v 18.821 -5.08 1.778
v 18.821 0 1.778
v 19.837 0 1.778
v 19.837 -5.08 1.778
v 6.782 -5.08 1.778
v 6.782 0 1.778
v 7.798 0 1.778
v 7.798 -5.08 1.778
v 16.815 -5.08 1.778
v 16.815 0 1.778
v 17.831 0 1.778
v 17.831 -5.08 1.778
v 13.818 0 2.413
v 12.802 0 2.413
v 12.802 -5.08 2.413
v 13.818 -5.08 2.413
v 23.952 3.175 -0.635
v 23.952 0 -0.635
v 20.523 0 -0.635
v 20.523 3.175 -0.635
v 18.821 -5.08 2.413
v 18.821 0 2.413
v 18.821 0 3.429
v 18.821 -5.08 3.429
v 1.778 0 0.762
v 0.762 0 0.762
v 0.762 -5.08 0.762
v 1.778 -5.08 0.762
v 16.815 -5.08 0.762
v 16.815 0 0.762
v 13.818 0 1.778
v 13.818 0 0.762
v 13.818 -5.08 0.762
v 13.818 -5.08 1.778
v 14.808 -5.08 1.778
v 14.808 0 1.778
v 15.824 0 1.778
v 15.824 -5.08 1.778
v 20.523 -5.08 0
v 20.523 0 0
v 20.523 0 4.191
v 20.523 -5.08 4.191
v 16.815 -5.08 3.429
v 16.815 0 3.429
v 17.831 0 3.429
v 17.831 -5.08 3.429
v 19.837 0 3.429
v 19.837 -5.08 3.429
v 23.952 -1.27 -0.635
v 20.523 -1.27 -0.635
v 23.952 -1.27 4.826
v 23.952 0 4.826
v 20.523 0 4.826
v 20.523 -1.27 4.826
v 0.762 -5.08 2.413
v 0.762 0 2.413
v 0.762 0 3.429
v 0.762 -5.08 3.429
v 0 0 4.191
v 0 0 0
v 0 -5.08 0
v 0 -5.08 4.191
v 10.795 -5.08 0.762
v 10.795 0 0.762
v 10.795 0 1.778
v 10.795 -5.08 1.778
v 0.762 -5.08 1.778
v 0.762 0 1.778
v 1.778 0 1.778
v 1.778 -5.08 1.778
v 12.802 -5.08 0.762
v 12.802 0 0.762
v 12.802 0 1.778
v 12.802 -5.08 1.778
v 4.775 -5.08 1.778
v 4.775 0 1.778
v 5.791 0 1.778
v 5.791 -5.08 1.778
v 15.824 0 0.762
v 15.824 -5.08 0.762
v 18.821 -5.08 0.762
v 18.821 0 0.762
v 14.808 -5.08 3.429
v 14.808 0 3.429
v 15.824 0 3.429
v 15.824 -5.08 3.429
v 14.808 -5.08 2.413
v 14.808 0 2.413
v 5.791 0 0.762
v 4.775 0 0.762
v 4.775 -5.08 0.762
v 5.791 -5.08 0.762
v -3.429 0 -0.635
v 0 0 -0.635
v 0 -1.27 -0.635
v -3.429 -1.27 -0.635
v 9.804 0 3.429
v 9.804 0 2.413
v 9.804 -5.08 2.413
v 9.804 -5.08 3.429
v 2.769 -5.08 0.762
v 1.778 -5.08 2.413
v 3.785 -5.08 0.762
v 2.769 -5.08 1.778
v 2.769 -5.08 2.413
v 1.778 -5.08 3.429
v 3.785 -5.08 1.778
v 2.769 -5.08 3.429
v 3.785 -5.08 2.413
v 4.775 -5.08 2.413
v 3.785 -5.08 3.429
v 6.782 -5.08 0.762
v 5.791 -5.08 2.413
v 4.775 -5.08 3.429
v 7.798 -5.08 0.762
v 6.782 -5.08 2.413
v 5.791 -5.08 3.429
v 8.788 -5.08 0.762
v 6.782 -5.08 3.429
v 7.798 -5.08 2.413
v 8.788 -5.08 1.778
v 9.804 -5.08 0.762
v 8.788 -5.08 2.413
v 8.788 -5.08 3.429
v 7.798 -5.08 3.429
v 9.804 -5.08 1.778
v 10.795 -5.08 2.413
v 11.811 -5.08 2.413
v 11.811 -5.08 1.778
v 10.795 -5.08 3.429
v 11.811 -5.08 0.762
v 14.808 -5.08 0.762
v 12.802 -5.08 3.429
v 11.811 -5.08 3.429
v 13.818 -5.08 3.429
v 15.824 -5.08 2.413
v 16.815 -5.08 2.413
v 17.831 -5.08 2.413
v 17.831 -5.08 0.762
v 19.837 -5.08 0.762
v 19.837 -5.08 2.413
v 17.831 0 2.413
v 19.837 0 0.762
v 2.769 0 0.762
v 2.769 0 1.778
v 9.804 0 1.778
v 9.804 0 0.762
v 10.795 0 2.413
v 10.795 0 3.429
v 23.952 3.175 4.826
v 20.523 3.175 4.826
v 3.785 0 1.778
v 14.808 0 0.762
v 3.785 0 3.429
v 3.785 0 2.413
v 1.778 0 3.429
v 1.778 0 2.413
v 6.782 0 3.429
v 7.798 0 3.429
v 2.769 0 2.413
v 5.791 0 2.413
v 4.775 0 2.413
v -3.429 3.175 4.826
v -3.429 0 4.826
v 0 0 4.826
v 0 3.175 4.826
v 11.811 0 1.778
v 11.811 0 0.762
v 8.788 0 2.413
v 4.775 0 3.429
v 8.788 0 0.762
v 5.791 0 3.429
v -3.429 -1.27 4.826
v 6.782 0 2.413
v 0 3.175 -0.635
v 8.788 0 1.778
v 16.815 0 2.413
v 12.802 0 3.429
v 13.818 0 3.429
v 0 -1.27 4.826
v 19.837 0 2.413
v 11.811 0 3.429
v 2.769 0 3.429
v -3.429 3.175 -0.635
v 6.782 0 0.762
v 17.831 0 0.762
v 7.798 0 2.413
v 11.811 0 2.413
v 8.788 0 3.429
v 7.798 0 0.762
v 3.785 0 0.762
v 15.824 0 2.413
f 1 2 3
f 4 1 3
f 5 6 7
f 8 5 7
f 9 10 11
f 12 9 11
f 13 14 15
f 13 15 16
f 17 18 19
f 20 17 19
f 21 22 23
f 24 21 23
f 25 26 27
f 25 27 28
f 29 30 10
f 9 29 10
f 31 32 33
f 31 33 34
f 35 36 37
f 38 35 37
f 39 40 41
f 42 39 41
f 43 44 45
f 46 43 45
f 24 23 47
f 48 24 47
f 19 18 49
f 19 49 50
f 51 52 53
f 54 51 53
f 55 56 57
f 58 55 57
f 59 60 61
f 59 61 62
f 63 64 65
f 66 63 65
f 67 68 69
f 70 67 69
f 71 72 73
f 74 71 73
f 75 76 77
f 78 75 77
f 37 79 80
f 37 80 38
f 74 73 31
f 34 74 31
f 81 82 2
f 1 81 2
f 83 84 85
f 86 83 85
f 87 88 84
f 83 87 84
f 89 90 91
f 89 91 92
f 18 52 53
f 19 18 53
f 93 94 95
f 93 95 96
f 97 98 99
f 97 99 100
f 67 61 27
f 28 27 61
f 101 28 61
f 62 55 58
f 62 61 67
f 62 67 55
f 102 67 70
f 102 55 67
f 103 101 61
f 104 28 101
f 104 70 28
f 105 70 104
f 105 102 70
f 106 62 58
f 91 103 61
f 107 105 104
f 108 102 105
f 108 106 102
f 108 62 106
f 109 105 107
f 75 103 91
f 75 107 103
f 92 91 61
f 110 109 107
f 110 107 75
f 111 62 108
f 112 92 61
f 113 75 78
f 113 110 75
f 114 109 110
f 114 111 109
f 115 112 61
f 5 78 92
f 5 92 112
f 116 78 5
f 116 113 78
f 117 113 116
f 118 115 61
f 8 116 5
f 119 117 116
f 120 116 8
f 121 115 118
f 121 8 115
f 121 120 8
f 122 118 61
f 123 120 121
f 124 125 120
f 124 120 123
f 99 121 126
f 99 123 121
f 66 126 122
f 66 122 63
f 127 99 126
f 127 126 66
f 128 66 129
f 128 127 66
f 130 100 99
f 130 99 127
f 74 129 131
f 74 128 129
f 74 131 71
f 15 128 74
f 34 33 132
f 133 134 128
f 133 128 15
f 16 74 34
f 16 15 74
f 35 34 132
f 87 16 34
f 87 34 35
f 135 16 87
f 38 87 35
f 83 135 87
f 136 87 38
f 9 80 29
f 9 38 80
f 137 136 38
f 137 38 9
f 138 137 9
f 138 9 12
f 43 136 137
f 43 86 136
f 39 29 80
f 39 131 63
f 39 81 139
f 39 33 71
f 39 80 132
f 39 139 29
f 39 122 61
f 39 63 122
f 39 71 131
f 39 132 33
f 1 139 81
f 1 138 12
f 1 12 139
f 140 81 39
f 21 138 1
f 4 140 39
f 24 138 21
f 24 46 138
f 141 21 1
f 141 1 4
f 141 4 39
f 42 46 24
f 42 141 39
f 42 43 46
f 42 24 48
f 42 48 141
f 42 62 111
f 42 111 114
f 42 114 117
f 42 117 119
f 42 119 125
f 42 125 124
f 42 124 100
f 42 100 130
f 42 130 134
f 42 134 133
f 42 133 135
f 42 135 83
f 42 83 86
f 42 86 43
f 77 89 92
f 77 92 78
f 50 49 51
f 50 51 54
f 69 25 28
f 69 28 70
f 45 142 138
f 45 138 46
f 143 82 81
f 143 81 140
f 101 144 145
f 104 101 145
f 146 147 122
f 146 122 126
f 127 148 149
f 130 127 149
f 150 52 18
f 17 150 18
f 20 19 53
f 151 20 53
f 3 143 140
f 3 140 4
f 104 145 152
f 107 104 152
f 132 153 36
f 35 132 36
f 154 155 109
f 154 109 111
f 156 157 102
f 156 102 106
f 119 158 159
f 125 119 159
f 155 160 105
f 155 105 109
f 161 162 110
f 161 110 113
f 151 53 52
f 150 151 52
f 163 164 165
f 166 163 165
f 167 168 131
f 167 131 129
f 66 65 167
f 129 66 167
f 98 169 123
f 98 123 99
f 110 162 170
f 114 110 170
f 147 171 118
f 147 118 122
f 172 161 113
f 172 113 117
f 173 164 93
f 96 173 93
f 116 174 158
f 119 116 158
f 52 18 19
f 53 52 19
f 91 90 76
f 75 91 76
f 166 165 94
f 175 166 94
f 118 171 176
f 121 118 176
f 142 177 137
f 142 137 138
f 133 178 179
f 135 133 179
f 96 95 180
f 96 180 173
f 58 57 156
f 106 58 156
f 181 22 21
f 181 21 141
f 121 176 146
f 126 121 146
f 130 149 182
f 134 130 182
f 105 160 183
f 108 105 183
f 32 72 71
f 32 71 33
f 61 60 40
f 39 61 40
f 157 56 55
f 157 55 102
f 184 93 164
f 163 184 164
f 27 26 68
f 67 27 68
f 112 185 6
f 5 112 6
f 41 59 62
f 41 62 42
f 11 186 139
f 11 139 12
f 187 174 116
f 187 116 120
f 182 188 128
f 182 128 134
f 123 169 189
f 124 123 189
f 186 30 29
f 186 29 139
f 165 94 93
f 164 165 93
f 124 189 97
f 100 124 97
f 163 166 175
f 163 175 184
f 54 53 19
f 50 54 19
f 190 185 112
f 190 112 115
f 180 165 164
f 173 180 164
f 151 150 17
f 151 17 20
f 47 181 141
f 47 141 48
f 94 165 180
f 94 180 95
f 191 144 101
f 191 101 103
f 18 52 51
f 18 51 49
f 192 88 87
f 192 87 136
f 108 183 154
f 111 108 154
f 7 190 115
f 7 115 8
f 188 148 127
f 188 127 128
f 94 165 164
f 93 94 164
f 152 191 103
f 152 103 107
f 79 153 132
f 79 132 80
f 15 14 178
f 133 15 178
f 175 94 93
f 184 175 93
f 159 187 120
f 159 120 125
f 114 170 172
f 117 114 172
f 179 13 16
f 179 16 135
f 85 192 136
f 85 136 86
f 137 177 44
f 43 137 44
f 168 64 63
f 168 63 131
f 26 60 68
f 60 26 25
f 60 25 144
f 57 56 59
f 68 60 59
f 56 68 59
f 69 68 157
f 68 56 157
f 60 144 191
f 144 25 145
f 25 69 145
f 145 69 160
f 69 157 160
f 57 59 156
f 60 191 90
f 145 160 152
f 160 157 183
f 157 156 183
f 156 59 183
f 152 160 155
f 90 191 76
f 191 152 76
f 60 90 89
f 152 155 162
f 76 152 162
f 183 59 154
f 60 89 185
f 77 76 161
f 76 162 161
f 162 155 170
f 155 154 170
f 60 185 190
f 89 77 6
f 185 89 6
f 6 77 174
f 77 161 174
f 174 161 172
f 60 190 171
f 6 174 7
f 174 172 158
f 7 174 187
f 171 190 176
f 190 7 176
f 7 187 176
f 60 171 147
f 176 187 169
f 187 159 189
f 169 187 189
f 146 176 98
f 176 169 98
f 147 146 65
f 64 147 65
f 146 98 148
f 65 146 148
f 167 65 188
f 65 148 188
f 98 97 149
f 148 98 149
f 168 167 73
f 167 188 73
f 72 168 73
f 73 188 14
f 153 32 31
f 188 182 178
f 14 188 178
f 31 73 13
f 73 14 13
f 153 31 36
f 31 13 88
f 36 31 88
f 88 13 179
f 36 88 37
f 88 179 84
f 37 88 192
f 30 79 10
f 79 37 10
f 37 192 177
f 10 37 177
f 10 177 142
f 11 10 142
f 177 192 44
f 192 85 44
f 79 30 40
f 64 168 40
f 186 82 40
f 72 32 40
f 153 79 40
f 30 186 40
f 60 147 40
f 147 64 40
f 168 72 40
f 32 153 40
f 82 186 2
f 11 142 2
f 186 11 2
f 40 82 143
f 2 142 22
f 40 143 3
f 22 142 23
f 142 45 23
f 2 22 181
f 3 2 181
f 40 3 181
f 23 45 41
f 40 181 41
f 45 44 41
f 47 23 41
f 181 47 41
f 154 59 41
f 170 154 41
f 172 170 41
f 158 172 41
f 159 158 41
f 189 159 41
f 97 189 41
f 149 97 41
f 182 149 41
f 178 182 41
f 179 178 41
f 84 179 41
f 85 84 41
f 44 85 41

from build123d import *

# Parameters (mm, degrees)
F0_W      = 20.5232
F0_H      = 4.191
F0_W_2    = 1.016
F0_H_2    = 1.016
F1_DEPTH  = 5.08
F3_DEPTH  = 3.175
F3_FACE_W = 3.429
F3_FACE_H = 5.461
F4_DEPTH  = 1.27


with BuildPart() as f1:
    # F0 (on Front) → F1 (new body)
    with BuildSketch(Plane.XZ):
        with Locations((10.2616, 2.0955)):
            Rectangle(F0_W, F0_H)
        with Locations((1.27, 1.27)):
            Rectangle(F0_W_2, F0_H_2, mode=Mode.SUBTRACT)
        with Locations((3.2766, 1.27)):
            Rectangle(F0_W_2, F0_H_2, mode=Mode.SUBTRACT)
        with Locations((5.2832, 1.27)):
            Rectangle(F0_W_2, F0_H_2, mode=Mode.SUBTRACT)
        with Locations((7.2898, 1.27)):
            Rectangle(F0_W_2, F0_H_2, mode=Mode.SUBTRACT)
        with Locations((9.2964, 1.27)):
            Rectangle(F0_W_2, F0_H_2, mode=Mode.SUBTRACT)
        with Locations((11.303, 1.27)):
            Rectangle(F0_W_2, F0_H_2, mode=Mode.SUBTRACT)
        with Locations((13.3096, 1.27)):
            Rectangle(F0_W_2, F0_H_2, mode=Mode.SUBTRACT)
        with Locations((15.3162, 1.27)):
            Rectangle(F0_W_2, F0_H_2, mode=Mode.SUBTRACT)
        with Locations((17.3228, 1.27)):
            Rectangle(F0_W_2, F0_H_2, mode=Mode.SUBTRACT)
        with Locations((19.3294, 1.27)):
            Rectangle(F0_W_2, F0_H_2, mode=Mode.SUBTRACT)
        with Locations((1.27, 2.921)):
            Rectangle(F0_W_2, F0_H_2, mode=Mode.SUBTRACT)
        with Locations((3.2766, 2.921)):
            Rectangle(F0_W_2, F0_H_2, mode=Mode.SUBTRACT)
        with Locations((5.2832, 2.921)):
            Rectangle(F0_W_2, F0_H_2, mode=Mode.SUBTRACT)
        with Locations((7.2898, 2.921)):
            Rectangle(F0_W_2, F0_H_2, mode=Mode.SUBTRACT)
        with Locations((9.2964, 2.921)):
            Rectangle(F0_W_2, F0_H_2, mode=Mode.SUBTRACT)
        with Locations((11.303, 2.921)):
            Rectangle(F0_W_2, F0_H_2, mode=Mode.SUBTRACT)
        with Locations((13.3096, 2.921)):
            Rectangle(F0_W_2, F0_H_2, mode=Mode.SUBTRACT)
        with Locations((15.3162, 2.921)):
            Rectangle(F0_W_2, F0_H_2, mode=Mode.SUBTRACT)
        with Locations((17.3228, 2.921)):
            Rectangle(F0_W_2, F0_H_2, mode=Mode.SUBTRACT)
        with Locations((19.3294, 2.921)):
            Rectangle(F0_W_2, F0_H_2, mode=Mode.SUBTRACT)
    extrude(amount=F1_DEPTH)


with BuildPart() as f3:
    # F2 (on face) → F3 (new body)
    with BuildSketch(Plane(origin=(0, 0, 0), x_dir=(-1, 0, 0), z_dir=(0, 1, 0))):
        Polygon((-20.5232, 4.826), (-23.9522, 4.826), (-23.9522, -0.635), (-20.5232, -0.635), (-20.5232, 0), (-20.5232, 4.191), align=None)
        Polygon((0, 4.826), (0, 4.191), (0, 0), (0, -0.635), (3.429, -0.635), (3.429, 4.826), align=None)
    extrude(amount=F3_DEPTH)


with BuildPart() as f4:
    # F3_face (on face) → F4 (new body)
    with BuildSketch(Plane(origin=(22.2377, 0, 2.0955), x_dir=(-1, 0, 0), z_dir=(0, -1, 0))):
        Rectangle(F3_FACE_W, F3_FACE_H)
        with Locations((23.9522, 0)):
            Rectangle(F3_FACE_W, F3_FACE_H)
    extrude(amount=F4_DEPTH)


solid = Compound([f1.part, f3.part, f4.part])
